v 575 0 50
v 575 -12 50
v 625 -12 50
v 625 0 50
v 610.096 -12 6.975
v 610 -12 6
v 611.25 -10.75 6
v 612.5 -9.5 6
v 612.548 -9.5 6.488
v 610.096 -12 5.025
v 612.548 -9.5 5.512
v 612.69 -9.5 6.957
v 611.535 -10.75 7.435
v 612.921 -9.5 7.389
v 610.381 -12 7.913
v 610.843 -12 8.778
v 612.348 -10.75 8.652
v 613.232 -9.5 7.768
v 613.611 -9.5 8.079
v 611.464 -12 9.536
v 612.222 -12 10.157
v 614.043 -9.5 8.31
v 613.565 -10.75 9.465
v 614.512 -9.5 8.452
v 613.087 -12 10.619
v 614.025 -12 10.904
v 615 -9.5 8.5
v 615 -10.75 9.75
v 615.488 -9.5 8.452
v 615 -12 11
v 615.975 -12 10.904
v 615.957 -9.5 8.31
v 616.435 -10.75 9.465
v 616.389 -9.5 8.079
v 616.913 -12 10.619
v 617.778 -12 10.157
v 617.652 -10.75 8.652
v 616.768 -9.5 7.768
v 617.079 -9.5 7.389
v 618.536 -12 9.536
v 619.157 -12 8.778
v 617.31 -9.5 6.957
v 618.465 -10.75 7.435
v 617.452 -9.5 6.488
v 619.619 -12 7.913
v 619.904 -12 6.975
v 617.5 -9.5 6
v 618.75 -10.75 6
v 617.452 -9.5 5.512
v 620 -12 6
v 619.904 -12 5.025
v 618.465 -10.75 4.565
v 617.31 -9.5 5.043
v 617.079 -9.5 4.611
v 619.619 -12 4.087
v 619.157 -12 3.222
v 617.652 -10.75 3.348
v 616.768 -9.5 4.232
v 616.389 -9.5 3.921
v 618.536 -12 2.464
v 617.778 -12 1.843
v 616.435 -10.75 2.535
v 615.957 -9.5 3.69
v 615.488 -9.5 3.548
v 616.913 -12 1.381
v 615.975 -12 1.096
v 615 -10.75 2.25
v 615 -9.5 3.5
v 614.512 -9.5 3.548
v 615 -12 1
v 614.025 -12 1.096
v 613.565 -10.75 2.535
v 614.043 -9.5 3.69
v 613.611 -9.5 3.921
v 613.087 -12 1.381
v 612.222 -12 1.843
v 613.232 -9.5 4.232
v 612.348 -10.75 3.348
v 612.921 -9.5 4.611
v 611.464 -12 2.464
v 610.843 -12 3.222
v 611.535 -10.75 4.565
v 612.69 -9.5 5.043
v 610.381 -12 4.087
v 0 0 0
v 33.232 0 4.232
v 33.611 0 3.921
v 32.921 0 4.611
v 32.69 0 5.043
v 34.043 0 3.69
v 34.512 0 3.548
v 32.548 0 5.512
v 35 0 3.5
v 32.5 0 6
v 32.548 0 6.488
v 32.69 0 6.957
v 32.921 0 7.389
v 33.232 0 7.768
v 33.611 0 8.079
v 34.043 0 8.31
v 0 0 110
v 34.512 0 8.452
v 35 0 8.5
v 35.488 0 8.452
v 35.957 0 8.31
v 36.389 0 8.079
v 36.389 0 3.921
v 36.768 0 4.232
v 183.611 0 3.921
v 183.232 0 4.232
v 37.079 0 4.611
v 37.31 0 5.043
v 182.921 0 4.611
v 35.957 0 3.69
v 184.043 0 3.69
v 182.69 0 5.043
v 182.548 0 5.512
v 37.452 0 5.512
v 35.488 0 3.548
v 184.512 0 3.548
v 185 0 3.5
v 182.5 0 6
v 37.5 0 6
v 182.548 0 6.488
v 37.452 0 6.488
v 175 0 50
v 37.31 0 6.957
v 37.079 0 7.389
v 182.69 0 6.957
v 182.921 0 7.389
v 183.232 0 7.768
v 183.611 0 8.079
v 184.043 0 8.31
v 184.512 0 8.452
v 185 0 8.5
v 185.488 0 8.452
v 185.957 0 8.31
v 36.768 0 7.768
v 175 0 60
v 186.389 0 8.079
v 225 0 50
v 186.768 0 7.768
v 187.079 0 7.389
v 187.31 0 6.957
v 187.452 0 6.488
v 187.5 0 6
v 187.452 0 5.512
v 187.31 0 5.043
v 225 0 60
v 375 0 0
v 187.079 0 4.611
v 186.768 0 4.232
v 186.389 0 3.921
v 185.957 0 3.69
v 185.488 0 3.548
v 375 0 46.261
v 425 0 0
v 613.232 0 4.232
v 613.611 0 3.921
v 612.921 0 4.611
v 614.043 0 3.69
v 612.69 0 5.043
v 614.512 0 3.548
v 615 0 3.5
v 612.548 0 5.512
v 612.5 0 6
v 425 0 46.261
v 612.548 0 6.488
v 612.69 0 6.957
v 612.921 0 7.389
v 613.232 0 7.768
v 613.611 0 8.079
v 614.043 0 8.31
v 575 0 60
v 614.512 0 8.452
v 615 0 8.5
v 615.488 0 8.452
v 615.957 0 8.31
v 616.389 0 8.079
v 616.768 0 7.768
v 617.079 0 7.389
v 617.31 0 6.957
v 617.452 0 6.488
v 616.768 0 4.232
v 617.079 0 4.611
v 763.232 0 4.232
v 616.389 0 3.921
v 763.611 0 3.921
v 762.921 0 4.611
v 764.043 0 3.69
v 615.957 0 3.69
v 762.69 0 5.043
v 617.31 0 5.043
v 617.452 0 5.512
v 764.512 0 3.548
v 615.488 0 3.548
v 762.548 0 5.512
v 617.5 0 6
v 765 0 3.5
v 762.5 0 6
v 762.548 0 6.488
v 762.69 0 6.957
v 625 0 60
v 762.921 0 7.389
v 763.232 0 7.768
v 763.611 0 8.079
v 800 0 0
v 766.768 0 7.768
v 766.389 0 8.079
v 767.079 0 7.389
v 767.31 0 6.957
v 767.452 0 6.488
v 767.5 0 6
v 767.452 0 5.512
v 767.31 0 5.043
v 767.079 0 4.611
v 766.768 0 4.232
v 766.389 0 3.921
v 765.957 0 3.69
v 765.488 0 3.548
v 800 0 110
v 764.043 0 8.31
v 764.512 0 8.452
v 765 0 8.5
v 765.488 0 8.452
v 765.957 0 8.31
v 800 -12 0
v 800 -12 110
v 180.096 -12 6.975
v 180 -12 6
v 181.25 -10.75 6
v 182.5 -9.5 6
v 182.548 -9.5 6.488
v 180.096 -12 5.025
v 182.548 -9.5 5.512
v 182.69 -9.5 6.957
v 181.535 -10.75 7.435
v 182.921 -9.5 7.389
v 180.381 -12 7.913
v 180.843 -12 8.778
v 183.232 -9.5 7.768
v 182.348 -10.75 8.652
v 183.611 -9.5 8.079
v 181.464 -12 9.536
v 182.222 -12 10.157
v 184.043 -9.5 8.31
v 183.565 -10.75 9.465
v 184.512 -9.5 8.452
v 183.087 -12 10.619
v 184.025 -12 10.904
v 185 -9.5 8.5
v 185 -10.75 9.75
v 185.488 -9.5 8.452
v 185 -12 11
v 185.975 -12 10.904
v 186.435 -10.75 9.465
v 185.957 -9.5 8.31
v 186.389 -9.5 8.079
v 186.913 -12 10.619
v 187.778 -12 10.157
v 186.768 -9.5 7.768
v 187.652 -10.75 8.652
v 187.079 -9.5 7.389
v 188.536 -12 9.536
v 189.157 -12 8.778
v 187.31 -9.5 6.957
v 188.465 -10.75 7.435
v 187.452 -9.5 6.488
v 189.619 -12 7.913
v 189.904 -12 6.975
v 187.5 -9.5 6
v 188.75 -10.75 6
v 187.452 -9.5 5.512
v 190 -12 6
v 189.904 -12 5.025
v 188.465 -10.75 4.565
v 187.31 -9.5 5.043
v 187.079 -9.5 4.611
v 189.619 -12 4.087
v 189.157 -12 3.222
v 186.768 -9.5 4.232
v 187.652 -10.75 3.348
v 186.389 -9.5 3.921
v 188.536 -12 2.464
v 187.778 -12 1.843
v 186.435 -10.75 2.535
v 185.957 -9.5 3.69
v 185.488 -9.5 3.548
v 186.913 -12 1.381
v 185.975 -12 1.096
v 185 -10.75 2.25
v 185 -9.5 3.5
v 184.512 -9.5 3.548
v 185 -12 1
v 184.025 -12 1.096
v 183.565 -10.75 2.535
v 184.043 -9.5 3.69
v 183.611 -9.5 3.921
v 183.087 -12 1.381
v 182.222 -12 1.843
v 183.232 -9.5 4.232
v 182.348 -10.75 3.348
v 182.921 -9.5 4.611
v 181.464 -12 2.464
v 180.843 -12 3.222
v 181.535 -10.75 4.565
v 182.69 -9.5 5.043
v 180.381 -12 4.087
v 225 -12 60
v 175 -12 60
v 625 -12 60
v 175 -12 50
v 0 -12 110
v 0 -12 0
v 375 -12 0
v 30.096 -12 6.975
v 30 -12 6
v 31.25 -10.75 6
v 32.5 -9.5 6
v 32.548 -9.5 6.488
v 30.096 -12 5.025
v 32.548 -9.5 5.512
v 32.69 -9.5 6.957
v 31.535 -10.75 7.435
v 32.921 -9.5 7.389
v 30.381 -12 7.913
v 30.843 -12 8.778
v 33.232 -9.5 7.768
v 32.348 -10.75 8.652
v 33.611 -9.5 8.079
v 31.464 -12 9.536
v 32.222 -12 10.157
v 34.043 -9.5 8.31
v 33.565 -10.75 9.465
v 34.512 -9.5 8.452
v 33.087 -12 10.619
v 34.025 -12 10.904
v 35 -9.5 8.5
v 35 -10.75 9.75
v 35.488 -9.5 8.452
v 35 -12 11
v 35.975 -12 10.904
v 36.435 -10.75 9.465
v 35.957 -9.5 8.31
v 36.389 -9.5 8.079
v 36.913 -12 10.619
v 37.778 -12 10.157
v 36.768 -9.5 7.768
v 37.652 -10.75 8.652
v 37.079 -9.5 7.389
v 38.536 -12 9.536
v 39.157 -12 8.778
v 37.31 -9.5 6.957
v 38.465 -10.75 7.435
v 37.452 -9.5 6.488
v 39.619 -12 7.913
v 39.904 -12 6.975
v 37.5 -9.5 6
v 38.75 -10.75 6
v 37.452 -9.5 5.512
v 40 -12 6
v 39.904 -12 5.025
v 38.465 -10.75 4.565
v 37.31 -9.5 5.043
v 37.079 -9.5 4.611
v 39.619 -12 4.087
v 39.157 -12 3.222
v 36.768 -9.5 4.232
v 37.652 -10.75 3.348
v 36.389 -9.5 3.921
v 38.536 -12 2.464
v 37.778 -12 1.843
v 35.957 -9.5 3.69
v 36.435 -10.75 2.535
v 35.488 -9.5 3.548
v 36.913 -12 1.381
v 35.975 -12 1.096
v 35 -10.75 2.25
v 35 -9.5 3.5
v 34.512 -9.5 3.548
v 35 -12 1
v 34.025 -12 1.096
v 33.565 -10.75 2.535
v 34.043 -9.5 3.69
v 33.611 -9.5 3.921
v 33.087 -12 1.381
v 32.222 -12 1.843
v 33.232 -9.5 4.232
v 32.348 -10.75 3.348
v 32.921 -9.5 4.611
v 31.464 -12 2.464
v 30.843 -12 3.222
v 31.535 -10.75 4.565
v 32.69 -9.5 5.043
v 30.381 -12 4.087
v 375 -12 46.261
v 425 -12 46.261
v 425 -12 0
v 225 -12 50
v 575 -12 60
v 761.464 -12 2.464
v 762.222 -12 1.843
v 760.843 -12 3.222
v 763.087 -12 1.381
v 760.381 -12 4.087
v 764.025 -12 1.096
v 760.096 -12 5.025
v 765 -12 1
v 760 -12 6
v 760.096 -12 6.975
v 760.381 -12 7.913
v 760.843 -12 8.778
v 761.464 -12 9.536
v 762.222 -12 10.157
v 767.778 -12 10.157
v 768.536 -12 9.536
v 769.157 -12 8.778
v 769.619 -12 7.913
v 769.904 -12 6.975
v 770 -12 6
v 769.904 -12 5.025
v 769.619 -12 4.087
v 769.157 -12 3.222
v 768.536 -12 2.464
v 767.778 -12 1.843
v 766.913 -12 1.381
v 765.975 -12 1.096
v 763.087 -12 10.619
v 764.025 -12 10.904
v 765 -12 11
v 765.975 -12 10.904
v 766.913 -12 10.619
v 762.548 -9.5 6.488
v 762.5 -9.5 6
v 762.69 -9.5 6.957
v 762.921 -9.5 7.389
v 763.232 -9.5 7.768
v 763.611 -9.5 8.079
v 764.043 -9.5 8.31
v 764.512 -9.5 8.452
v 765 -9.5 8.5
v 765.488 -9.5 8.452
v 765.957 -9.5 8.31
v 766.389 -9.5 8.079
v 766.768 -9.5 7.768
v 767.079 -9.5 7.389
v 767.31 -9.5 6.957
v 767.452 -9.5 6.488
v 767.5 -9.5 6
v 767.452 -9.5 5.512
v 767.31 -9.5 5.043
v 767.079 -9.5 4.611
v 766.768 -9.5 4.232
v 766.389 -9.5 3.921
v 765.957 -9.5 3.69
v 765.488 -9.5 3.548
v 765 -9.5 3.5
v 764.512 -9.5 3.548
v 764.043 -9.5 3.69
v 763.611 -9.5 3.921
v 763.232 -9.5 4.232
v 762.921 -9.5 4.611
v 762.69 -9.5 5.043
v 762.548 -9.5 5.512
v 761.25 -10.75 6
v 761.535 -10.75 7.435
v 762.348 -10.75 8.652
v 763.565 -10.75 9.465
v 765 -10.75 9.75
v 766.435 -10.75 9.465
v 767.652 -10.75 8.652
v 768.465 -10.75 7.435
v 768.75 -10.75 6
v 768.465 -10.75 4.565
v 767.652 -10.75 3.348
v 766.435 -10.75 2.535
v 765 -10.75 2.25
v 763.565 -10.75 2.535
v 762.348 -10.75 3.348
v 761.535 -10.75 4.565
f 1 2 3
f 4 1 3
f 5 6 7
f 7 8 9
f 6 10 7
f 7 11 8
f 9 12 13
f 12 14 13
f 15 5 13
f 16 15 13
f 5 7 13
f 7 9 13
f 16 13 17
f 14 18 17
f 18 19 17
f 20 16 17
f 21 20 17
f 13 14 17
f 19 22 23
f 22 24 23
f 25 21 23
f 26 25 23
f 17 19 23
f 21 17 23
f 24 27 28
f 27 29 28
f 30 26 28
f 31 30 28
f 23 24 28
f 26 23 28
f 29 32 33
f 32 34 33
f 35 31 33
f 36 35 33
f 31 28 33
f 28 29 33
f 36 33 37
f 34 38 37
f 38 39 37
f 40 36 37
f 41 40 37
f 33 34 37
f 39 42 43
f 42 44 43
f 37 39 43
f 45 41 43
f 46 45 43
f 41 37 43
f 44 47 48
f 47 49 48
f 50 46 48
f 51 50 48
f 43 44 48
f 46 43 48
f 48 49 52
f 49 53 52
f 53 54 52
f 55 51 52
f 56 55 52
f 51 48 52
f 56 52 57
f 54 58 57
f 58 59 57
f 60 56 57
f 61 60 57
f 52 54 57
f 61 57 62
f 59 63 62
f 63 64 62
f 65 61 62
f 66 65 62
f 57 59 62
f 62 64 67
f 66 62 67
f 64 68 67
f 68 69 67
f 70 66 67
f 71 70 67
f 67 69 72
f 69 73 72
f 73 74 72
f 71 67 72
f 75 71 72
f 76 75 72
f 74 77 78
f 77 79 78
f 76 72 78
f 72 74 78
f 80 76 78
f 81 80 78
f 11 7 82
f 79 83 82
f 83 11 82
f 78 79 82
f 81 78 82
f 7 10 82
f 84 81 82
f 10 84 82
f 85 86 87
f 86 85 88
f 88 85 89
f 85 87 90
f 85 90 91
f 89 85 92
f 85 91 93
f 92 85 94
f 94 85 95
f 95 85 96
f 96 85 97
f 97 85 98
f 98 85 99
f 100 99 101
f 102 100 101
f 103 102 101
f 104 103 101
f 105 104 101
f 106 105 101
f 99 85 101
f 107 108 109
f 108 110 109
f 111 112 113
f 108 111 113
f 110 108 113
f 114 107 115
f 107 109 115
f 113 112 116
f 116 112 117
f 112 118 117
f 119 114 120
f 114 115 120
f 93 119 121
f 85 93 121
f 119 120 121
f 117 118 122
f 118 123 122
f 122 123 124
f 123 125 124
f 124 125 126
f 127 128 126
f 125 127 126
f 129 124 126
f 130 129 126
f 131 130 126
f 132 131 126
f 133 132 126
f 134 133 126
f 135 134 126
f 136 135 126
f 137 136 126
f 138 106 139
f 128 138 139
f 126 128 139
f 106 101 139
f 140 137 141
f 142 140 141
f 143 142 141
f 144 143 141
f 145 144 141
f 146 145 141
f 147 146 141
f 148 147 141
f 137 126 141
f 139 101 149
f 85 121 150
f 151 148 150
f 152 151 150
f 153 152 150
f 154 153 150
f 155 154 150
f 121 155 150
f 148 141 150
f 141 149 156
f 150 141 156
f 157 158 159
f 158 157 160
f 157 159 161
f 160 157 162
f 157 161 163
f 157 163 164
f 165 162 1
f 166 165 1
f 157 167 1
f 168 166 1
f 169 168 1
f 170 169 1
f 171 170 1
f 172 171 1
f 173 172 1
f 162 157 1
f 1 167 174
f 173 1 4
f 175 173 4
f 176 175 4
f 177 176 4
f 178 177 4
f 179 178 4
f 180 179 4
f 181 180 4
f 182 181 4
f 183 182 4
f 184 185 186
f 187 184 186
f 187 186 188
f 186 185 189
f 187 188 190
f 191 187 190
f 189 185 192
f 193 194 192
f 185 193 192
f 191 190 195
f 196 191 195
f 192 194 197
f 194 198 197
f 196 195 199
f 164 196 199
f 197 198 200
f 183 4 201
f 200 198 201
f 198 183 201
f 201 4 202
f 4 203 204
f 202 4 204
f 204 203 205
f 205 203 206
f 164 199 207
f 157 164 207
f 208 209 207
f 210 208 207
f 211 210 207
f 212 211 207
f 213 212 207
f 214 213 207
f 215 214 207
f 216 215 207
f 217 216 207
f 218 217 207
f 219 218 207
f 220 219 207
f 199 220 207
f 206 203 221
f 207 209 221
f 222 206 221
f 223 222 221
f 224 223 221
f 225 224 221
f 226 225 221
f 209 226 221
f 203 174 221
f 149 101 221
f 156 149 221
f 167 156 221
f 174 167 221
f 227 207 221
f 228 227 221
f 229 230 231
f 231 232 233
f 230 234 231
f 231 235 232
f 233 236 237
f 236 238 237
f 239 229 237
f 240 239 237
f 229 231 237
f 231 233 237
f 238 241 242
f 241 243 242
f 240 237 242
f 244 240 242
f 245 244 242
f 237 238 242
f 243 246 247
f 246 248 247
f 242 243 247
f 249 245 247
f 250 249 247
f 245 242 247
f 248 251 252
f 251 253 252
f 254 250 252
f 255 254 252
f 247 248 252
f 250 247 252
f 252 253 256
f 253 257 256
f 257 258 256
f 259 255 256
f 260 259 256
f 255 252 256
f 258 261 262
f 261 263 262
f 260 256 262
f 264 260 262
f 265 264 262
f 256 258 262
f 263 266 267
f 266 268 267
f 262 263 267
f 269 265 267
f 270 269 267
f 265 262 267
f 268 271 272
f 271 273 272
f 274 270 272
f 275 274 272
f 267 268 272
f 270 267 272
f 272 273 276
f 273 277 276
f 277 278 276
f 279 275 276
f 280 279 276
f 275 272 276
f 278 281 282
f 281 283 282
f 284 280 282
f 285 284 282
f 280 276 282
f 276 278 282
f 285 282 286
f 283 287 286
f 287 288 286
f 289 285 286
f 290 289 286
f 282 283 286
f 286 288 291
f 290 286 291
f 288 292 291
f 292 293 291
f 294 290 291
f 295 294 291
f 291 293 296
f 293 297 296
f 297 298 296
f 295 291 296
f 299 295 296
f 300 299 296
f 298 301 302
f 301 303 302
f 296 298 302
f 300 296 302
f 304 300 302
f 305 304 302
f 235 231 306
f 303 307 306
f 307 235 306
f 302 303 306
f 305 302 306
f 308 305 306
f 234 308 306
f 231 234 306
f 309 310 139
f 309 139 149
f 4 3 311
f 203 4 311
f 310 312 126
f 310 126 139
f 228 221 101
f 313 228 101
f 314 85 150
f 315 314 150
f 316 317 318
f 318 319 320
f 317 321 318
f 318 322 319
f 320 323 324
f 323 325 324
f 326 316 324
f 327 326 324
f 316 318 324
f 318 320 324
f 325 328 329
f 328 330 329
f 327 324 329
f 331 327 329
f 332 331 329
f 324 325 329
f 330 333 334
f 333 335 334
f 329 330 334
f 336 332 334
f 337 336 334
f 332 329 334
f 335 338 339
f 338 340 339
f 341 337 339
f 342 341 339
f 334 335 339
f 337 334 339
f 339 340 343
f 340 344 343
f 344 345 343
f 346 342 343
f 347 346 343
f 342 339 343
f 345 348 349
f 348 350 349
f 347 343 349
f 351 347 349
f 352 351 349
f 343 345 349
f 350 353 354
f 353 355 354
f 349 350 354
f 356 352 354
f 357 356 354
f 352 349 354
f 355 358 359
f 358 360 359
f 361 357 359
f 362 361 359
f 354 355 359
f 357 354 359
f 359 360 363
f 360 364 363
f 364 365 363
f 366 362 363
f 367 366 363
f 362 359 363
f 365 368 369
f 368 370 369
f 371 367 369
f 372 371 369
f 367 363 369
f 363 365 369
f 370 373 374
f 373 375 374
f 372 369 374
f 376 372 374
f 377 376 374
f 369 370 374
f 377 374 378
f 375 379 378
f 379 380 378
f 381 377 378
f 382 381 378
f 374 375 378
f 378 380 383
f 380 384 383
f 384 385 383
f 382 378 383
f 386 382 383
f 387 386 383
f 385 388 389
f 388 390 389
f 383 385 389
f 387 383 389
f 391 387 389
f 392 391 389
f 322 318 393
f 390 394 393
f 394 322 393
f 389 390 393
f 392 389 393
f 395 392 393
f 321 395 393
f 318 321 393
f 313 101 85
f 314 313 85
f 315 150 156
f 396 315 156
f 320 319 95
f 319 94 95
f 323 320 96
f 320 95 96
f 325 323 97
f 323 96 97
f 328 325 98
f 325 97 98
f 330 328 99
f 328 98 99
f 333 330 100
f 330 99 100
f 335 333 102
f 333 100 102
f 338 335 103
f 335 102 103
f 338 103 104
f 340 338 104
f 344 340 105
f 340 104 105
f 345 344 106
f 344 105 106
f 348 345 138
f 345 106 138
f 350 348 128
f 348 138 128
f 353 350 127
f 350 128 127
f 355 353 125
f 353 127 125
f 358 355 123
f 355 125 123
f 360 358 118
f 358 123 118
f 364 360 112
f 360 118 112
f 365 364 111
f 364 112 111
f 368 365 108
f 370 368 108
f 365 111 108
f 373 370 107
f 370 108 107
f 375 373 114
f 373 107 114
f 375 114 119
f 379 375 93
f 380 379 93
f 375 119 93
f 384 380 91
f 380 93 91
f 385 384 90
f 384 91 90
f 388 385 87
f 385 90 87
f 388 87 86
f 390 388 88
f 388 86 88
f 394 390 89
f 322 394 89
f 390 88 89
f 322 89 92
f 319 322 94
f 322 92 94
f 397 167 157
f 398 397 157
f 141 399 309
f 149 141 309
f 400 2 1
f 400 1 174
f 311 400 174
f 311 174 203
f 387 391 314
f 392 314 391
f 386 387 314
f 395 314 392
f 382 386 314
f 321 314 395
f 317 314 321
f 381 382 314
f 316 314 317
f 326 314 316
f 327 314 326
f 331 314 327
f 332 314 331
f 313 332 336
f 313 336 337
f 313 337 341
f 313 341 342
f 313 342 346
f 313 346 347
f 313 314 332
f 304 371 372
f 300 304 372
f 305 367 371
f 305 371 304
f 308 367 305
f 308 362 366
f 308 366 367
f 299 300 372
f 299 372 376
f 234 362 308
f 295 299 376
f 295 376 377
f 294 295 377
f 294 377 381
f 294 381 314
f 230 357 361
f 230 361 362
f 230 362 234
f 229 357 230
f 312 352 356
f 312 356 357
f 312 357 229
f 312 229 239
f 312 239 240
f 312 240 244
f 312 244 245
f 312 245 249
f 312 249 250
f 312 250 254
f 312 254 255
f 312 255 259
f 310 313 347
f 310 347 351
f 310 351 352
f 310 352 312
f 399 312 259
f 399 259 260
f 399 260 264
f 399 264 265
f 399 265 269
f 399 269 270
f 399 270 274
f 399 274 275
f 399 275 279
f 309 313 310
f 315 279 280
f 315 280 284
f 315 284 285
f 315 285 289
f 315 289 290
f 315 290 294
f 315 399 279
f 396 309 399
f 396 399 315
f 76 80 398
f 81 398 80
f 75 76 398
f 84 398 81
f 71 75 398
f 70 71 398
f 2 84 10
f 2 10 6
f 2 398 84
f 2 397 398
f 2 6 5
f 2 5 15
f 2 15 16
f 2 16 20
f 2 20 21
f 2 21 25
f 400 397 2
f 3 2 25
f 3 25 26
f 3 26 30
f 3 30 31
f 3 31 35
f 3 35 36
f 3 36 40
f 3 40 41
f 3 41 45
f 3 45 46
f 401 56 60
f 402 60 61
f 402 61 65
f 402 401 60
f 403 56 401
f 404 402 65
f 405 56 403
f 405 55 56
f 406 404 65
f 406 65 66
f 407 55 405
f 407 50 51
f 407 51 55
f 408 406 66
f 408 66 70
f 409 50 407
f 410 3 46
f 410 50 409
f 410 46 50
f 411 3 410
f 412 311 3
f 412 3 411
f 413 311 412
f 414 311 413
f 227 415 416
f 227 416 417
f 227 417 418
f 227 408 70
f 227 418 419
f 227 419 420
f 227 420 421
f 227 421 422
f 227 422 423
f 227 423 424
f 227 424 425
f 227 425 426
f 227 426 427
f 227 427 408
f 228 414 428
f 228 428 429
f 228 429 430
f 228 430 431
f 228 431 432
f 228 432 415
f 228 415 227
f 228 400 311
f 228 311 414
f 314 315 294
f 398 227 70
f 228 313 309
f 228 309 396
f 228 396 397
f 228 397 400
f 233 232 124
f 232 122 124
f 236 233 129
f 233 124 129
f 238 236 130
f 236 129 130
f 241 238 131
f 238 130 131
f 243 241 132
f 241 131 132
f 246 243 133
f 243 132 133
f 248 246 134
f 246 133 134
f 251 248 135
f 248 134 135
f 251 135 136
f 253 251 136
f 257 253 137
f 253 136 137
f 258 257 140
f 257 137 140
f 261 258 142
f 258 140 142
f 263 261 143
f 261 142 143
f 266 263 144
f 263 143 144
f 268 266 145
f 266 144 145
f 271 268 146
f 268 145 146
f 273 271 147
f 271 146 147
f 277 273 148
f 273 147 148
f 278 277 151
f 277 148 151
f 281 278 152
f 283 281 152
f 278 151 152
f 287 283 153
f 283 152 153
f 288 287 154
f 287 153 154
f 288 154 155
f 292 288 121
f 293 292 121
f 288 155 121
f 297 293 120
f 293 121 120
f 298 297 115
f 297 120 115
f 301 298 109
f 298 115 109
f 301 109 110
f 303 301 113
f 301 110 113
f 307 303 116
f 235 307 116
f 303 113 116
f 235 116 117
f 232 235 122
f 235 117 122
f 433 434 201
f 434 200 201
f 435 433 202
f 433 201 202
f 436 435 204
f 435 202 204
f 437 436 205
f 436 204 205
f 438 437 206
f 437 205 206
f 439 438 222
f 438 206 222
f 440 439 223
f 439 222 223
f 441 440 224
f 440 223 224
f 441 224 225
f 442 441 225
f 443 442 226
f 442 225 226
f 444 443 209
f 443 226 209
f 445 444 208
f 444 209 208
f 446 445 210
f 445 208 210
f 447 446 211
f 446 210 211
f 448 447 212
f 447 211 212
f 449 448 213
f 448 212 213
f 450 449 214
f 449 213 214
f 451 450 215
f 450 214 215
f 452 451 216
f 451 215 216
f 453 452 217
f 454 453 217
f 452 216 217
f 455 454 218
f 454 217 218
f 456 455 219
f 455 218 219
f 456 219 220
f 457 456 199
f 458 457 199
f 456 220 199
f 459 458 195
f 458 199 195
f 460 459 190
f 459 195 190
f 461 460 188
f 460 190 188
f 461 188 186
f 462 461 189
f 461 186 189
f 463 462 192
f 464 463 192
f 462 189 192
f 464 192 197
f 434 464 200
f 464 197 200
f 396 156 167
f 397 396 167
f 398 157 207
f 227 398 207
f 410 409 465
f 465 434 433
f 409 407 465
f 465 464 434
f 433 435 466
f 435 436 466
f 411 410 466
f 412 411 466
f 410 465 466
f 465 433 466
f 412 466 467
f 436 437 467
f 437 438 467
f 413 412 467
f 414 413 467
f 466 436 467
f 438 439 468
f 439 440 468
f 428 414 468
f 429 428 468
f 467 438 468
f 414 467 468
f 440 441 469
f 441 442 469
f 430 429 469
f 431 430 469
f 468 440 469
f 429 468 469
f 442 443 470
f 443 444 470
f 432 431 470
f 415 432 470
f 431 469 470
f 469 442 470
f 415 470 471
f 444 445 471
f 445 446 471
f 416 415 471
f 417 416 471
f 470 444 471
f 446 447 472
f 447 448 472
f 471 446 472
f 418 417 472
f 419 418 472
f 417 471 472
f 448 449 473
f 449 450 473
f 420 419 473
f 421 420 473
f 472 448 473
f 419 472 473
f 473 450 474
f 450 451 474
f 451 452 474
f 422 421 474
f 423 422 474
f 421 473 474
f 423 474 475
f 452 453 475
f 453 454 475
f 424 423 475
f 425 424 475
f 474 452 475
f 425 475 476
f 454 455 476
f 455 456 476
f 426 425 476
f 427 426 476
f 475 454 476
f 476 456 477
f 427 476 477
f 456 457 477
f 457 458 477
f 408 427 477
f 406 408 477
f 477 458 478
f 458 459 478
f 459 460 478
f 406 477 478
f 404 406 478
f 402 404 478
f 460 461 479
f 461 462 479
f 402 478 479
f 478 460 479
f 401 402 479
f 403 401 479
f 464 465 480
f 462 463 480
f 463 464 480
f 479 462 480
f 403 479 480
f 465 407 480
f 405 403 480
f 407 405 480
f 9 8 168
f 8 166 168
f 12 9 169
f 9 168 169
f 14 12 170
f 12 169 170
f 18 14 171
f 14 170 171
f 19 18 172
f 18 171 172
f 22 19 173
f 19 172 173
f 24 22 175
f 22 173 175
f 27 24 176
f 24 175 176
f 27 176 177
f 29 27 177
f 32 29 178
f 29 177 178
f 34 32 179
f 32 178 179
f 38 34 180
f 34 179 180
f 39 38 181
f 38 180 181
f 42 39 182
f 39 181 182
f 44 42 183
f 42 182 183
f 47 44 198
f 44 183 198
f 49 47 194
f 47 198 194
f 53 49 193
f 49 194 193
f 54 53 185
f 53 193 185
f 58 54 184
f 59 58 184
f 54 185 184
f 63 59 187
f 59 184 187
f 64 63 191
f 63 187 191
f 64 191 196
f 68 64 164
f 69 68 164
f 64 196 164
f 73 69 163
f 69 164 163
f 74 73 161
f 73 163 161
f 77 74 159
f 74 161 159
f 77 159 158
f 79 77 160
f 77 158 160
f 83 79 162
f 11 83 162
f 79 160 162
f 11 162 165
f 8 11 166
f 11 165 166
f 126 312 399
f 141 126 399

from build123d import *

# Parameters (mm, degrees)
F1_DEPTH       = 12
F3_D           = 5
F3_CSINK_D     = 10
F3_CSINK_ANGLE = 90
F4_W           = 50
F4_H           = 10
F5_DEPTH       = 25


with BuildPart() as f1:
    # F0 (on Front) → F1 (new body)
    with BuildSketch(Plane.XZ):
        Polygon((0, 110), (0, 0), (375, 0), (375, 46.2607331574), (425, 46.2607331574), (425, 0), (800, 0), (800, 110), align=None)
    extrude(amount=F1_DEPTH)

    # F3 (through all)
    with Locations(Plane.XZ.offset(12)):
        with Locations((35, 6), (185, 6), (615, 6), (765, 6)):
            CounterSinkHole(F3_D / 2, F3_CSINK_D / 2, counter_sink_angle=F3_CSINK_ANGLE)

    # F4 (on face) → F5 (cut)
    with BuildSketch(Plane.XZ.offset(12)):
        with Locations((200, 55)):
            Rectangle(F4_W, F4_H)
        with Locations((600, 55)):
            Rectangle(F4_W, F4_H)
    extrude(amount=-F5_DEPTH, mode=Mode.SUBTRACT)


solid = f1.part
